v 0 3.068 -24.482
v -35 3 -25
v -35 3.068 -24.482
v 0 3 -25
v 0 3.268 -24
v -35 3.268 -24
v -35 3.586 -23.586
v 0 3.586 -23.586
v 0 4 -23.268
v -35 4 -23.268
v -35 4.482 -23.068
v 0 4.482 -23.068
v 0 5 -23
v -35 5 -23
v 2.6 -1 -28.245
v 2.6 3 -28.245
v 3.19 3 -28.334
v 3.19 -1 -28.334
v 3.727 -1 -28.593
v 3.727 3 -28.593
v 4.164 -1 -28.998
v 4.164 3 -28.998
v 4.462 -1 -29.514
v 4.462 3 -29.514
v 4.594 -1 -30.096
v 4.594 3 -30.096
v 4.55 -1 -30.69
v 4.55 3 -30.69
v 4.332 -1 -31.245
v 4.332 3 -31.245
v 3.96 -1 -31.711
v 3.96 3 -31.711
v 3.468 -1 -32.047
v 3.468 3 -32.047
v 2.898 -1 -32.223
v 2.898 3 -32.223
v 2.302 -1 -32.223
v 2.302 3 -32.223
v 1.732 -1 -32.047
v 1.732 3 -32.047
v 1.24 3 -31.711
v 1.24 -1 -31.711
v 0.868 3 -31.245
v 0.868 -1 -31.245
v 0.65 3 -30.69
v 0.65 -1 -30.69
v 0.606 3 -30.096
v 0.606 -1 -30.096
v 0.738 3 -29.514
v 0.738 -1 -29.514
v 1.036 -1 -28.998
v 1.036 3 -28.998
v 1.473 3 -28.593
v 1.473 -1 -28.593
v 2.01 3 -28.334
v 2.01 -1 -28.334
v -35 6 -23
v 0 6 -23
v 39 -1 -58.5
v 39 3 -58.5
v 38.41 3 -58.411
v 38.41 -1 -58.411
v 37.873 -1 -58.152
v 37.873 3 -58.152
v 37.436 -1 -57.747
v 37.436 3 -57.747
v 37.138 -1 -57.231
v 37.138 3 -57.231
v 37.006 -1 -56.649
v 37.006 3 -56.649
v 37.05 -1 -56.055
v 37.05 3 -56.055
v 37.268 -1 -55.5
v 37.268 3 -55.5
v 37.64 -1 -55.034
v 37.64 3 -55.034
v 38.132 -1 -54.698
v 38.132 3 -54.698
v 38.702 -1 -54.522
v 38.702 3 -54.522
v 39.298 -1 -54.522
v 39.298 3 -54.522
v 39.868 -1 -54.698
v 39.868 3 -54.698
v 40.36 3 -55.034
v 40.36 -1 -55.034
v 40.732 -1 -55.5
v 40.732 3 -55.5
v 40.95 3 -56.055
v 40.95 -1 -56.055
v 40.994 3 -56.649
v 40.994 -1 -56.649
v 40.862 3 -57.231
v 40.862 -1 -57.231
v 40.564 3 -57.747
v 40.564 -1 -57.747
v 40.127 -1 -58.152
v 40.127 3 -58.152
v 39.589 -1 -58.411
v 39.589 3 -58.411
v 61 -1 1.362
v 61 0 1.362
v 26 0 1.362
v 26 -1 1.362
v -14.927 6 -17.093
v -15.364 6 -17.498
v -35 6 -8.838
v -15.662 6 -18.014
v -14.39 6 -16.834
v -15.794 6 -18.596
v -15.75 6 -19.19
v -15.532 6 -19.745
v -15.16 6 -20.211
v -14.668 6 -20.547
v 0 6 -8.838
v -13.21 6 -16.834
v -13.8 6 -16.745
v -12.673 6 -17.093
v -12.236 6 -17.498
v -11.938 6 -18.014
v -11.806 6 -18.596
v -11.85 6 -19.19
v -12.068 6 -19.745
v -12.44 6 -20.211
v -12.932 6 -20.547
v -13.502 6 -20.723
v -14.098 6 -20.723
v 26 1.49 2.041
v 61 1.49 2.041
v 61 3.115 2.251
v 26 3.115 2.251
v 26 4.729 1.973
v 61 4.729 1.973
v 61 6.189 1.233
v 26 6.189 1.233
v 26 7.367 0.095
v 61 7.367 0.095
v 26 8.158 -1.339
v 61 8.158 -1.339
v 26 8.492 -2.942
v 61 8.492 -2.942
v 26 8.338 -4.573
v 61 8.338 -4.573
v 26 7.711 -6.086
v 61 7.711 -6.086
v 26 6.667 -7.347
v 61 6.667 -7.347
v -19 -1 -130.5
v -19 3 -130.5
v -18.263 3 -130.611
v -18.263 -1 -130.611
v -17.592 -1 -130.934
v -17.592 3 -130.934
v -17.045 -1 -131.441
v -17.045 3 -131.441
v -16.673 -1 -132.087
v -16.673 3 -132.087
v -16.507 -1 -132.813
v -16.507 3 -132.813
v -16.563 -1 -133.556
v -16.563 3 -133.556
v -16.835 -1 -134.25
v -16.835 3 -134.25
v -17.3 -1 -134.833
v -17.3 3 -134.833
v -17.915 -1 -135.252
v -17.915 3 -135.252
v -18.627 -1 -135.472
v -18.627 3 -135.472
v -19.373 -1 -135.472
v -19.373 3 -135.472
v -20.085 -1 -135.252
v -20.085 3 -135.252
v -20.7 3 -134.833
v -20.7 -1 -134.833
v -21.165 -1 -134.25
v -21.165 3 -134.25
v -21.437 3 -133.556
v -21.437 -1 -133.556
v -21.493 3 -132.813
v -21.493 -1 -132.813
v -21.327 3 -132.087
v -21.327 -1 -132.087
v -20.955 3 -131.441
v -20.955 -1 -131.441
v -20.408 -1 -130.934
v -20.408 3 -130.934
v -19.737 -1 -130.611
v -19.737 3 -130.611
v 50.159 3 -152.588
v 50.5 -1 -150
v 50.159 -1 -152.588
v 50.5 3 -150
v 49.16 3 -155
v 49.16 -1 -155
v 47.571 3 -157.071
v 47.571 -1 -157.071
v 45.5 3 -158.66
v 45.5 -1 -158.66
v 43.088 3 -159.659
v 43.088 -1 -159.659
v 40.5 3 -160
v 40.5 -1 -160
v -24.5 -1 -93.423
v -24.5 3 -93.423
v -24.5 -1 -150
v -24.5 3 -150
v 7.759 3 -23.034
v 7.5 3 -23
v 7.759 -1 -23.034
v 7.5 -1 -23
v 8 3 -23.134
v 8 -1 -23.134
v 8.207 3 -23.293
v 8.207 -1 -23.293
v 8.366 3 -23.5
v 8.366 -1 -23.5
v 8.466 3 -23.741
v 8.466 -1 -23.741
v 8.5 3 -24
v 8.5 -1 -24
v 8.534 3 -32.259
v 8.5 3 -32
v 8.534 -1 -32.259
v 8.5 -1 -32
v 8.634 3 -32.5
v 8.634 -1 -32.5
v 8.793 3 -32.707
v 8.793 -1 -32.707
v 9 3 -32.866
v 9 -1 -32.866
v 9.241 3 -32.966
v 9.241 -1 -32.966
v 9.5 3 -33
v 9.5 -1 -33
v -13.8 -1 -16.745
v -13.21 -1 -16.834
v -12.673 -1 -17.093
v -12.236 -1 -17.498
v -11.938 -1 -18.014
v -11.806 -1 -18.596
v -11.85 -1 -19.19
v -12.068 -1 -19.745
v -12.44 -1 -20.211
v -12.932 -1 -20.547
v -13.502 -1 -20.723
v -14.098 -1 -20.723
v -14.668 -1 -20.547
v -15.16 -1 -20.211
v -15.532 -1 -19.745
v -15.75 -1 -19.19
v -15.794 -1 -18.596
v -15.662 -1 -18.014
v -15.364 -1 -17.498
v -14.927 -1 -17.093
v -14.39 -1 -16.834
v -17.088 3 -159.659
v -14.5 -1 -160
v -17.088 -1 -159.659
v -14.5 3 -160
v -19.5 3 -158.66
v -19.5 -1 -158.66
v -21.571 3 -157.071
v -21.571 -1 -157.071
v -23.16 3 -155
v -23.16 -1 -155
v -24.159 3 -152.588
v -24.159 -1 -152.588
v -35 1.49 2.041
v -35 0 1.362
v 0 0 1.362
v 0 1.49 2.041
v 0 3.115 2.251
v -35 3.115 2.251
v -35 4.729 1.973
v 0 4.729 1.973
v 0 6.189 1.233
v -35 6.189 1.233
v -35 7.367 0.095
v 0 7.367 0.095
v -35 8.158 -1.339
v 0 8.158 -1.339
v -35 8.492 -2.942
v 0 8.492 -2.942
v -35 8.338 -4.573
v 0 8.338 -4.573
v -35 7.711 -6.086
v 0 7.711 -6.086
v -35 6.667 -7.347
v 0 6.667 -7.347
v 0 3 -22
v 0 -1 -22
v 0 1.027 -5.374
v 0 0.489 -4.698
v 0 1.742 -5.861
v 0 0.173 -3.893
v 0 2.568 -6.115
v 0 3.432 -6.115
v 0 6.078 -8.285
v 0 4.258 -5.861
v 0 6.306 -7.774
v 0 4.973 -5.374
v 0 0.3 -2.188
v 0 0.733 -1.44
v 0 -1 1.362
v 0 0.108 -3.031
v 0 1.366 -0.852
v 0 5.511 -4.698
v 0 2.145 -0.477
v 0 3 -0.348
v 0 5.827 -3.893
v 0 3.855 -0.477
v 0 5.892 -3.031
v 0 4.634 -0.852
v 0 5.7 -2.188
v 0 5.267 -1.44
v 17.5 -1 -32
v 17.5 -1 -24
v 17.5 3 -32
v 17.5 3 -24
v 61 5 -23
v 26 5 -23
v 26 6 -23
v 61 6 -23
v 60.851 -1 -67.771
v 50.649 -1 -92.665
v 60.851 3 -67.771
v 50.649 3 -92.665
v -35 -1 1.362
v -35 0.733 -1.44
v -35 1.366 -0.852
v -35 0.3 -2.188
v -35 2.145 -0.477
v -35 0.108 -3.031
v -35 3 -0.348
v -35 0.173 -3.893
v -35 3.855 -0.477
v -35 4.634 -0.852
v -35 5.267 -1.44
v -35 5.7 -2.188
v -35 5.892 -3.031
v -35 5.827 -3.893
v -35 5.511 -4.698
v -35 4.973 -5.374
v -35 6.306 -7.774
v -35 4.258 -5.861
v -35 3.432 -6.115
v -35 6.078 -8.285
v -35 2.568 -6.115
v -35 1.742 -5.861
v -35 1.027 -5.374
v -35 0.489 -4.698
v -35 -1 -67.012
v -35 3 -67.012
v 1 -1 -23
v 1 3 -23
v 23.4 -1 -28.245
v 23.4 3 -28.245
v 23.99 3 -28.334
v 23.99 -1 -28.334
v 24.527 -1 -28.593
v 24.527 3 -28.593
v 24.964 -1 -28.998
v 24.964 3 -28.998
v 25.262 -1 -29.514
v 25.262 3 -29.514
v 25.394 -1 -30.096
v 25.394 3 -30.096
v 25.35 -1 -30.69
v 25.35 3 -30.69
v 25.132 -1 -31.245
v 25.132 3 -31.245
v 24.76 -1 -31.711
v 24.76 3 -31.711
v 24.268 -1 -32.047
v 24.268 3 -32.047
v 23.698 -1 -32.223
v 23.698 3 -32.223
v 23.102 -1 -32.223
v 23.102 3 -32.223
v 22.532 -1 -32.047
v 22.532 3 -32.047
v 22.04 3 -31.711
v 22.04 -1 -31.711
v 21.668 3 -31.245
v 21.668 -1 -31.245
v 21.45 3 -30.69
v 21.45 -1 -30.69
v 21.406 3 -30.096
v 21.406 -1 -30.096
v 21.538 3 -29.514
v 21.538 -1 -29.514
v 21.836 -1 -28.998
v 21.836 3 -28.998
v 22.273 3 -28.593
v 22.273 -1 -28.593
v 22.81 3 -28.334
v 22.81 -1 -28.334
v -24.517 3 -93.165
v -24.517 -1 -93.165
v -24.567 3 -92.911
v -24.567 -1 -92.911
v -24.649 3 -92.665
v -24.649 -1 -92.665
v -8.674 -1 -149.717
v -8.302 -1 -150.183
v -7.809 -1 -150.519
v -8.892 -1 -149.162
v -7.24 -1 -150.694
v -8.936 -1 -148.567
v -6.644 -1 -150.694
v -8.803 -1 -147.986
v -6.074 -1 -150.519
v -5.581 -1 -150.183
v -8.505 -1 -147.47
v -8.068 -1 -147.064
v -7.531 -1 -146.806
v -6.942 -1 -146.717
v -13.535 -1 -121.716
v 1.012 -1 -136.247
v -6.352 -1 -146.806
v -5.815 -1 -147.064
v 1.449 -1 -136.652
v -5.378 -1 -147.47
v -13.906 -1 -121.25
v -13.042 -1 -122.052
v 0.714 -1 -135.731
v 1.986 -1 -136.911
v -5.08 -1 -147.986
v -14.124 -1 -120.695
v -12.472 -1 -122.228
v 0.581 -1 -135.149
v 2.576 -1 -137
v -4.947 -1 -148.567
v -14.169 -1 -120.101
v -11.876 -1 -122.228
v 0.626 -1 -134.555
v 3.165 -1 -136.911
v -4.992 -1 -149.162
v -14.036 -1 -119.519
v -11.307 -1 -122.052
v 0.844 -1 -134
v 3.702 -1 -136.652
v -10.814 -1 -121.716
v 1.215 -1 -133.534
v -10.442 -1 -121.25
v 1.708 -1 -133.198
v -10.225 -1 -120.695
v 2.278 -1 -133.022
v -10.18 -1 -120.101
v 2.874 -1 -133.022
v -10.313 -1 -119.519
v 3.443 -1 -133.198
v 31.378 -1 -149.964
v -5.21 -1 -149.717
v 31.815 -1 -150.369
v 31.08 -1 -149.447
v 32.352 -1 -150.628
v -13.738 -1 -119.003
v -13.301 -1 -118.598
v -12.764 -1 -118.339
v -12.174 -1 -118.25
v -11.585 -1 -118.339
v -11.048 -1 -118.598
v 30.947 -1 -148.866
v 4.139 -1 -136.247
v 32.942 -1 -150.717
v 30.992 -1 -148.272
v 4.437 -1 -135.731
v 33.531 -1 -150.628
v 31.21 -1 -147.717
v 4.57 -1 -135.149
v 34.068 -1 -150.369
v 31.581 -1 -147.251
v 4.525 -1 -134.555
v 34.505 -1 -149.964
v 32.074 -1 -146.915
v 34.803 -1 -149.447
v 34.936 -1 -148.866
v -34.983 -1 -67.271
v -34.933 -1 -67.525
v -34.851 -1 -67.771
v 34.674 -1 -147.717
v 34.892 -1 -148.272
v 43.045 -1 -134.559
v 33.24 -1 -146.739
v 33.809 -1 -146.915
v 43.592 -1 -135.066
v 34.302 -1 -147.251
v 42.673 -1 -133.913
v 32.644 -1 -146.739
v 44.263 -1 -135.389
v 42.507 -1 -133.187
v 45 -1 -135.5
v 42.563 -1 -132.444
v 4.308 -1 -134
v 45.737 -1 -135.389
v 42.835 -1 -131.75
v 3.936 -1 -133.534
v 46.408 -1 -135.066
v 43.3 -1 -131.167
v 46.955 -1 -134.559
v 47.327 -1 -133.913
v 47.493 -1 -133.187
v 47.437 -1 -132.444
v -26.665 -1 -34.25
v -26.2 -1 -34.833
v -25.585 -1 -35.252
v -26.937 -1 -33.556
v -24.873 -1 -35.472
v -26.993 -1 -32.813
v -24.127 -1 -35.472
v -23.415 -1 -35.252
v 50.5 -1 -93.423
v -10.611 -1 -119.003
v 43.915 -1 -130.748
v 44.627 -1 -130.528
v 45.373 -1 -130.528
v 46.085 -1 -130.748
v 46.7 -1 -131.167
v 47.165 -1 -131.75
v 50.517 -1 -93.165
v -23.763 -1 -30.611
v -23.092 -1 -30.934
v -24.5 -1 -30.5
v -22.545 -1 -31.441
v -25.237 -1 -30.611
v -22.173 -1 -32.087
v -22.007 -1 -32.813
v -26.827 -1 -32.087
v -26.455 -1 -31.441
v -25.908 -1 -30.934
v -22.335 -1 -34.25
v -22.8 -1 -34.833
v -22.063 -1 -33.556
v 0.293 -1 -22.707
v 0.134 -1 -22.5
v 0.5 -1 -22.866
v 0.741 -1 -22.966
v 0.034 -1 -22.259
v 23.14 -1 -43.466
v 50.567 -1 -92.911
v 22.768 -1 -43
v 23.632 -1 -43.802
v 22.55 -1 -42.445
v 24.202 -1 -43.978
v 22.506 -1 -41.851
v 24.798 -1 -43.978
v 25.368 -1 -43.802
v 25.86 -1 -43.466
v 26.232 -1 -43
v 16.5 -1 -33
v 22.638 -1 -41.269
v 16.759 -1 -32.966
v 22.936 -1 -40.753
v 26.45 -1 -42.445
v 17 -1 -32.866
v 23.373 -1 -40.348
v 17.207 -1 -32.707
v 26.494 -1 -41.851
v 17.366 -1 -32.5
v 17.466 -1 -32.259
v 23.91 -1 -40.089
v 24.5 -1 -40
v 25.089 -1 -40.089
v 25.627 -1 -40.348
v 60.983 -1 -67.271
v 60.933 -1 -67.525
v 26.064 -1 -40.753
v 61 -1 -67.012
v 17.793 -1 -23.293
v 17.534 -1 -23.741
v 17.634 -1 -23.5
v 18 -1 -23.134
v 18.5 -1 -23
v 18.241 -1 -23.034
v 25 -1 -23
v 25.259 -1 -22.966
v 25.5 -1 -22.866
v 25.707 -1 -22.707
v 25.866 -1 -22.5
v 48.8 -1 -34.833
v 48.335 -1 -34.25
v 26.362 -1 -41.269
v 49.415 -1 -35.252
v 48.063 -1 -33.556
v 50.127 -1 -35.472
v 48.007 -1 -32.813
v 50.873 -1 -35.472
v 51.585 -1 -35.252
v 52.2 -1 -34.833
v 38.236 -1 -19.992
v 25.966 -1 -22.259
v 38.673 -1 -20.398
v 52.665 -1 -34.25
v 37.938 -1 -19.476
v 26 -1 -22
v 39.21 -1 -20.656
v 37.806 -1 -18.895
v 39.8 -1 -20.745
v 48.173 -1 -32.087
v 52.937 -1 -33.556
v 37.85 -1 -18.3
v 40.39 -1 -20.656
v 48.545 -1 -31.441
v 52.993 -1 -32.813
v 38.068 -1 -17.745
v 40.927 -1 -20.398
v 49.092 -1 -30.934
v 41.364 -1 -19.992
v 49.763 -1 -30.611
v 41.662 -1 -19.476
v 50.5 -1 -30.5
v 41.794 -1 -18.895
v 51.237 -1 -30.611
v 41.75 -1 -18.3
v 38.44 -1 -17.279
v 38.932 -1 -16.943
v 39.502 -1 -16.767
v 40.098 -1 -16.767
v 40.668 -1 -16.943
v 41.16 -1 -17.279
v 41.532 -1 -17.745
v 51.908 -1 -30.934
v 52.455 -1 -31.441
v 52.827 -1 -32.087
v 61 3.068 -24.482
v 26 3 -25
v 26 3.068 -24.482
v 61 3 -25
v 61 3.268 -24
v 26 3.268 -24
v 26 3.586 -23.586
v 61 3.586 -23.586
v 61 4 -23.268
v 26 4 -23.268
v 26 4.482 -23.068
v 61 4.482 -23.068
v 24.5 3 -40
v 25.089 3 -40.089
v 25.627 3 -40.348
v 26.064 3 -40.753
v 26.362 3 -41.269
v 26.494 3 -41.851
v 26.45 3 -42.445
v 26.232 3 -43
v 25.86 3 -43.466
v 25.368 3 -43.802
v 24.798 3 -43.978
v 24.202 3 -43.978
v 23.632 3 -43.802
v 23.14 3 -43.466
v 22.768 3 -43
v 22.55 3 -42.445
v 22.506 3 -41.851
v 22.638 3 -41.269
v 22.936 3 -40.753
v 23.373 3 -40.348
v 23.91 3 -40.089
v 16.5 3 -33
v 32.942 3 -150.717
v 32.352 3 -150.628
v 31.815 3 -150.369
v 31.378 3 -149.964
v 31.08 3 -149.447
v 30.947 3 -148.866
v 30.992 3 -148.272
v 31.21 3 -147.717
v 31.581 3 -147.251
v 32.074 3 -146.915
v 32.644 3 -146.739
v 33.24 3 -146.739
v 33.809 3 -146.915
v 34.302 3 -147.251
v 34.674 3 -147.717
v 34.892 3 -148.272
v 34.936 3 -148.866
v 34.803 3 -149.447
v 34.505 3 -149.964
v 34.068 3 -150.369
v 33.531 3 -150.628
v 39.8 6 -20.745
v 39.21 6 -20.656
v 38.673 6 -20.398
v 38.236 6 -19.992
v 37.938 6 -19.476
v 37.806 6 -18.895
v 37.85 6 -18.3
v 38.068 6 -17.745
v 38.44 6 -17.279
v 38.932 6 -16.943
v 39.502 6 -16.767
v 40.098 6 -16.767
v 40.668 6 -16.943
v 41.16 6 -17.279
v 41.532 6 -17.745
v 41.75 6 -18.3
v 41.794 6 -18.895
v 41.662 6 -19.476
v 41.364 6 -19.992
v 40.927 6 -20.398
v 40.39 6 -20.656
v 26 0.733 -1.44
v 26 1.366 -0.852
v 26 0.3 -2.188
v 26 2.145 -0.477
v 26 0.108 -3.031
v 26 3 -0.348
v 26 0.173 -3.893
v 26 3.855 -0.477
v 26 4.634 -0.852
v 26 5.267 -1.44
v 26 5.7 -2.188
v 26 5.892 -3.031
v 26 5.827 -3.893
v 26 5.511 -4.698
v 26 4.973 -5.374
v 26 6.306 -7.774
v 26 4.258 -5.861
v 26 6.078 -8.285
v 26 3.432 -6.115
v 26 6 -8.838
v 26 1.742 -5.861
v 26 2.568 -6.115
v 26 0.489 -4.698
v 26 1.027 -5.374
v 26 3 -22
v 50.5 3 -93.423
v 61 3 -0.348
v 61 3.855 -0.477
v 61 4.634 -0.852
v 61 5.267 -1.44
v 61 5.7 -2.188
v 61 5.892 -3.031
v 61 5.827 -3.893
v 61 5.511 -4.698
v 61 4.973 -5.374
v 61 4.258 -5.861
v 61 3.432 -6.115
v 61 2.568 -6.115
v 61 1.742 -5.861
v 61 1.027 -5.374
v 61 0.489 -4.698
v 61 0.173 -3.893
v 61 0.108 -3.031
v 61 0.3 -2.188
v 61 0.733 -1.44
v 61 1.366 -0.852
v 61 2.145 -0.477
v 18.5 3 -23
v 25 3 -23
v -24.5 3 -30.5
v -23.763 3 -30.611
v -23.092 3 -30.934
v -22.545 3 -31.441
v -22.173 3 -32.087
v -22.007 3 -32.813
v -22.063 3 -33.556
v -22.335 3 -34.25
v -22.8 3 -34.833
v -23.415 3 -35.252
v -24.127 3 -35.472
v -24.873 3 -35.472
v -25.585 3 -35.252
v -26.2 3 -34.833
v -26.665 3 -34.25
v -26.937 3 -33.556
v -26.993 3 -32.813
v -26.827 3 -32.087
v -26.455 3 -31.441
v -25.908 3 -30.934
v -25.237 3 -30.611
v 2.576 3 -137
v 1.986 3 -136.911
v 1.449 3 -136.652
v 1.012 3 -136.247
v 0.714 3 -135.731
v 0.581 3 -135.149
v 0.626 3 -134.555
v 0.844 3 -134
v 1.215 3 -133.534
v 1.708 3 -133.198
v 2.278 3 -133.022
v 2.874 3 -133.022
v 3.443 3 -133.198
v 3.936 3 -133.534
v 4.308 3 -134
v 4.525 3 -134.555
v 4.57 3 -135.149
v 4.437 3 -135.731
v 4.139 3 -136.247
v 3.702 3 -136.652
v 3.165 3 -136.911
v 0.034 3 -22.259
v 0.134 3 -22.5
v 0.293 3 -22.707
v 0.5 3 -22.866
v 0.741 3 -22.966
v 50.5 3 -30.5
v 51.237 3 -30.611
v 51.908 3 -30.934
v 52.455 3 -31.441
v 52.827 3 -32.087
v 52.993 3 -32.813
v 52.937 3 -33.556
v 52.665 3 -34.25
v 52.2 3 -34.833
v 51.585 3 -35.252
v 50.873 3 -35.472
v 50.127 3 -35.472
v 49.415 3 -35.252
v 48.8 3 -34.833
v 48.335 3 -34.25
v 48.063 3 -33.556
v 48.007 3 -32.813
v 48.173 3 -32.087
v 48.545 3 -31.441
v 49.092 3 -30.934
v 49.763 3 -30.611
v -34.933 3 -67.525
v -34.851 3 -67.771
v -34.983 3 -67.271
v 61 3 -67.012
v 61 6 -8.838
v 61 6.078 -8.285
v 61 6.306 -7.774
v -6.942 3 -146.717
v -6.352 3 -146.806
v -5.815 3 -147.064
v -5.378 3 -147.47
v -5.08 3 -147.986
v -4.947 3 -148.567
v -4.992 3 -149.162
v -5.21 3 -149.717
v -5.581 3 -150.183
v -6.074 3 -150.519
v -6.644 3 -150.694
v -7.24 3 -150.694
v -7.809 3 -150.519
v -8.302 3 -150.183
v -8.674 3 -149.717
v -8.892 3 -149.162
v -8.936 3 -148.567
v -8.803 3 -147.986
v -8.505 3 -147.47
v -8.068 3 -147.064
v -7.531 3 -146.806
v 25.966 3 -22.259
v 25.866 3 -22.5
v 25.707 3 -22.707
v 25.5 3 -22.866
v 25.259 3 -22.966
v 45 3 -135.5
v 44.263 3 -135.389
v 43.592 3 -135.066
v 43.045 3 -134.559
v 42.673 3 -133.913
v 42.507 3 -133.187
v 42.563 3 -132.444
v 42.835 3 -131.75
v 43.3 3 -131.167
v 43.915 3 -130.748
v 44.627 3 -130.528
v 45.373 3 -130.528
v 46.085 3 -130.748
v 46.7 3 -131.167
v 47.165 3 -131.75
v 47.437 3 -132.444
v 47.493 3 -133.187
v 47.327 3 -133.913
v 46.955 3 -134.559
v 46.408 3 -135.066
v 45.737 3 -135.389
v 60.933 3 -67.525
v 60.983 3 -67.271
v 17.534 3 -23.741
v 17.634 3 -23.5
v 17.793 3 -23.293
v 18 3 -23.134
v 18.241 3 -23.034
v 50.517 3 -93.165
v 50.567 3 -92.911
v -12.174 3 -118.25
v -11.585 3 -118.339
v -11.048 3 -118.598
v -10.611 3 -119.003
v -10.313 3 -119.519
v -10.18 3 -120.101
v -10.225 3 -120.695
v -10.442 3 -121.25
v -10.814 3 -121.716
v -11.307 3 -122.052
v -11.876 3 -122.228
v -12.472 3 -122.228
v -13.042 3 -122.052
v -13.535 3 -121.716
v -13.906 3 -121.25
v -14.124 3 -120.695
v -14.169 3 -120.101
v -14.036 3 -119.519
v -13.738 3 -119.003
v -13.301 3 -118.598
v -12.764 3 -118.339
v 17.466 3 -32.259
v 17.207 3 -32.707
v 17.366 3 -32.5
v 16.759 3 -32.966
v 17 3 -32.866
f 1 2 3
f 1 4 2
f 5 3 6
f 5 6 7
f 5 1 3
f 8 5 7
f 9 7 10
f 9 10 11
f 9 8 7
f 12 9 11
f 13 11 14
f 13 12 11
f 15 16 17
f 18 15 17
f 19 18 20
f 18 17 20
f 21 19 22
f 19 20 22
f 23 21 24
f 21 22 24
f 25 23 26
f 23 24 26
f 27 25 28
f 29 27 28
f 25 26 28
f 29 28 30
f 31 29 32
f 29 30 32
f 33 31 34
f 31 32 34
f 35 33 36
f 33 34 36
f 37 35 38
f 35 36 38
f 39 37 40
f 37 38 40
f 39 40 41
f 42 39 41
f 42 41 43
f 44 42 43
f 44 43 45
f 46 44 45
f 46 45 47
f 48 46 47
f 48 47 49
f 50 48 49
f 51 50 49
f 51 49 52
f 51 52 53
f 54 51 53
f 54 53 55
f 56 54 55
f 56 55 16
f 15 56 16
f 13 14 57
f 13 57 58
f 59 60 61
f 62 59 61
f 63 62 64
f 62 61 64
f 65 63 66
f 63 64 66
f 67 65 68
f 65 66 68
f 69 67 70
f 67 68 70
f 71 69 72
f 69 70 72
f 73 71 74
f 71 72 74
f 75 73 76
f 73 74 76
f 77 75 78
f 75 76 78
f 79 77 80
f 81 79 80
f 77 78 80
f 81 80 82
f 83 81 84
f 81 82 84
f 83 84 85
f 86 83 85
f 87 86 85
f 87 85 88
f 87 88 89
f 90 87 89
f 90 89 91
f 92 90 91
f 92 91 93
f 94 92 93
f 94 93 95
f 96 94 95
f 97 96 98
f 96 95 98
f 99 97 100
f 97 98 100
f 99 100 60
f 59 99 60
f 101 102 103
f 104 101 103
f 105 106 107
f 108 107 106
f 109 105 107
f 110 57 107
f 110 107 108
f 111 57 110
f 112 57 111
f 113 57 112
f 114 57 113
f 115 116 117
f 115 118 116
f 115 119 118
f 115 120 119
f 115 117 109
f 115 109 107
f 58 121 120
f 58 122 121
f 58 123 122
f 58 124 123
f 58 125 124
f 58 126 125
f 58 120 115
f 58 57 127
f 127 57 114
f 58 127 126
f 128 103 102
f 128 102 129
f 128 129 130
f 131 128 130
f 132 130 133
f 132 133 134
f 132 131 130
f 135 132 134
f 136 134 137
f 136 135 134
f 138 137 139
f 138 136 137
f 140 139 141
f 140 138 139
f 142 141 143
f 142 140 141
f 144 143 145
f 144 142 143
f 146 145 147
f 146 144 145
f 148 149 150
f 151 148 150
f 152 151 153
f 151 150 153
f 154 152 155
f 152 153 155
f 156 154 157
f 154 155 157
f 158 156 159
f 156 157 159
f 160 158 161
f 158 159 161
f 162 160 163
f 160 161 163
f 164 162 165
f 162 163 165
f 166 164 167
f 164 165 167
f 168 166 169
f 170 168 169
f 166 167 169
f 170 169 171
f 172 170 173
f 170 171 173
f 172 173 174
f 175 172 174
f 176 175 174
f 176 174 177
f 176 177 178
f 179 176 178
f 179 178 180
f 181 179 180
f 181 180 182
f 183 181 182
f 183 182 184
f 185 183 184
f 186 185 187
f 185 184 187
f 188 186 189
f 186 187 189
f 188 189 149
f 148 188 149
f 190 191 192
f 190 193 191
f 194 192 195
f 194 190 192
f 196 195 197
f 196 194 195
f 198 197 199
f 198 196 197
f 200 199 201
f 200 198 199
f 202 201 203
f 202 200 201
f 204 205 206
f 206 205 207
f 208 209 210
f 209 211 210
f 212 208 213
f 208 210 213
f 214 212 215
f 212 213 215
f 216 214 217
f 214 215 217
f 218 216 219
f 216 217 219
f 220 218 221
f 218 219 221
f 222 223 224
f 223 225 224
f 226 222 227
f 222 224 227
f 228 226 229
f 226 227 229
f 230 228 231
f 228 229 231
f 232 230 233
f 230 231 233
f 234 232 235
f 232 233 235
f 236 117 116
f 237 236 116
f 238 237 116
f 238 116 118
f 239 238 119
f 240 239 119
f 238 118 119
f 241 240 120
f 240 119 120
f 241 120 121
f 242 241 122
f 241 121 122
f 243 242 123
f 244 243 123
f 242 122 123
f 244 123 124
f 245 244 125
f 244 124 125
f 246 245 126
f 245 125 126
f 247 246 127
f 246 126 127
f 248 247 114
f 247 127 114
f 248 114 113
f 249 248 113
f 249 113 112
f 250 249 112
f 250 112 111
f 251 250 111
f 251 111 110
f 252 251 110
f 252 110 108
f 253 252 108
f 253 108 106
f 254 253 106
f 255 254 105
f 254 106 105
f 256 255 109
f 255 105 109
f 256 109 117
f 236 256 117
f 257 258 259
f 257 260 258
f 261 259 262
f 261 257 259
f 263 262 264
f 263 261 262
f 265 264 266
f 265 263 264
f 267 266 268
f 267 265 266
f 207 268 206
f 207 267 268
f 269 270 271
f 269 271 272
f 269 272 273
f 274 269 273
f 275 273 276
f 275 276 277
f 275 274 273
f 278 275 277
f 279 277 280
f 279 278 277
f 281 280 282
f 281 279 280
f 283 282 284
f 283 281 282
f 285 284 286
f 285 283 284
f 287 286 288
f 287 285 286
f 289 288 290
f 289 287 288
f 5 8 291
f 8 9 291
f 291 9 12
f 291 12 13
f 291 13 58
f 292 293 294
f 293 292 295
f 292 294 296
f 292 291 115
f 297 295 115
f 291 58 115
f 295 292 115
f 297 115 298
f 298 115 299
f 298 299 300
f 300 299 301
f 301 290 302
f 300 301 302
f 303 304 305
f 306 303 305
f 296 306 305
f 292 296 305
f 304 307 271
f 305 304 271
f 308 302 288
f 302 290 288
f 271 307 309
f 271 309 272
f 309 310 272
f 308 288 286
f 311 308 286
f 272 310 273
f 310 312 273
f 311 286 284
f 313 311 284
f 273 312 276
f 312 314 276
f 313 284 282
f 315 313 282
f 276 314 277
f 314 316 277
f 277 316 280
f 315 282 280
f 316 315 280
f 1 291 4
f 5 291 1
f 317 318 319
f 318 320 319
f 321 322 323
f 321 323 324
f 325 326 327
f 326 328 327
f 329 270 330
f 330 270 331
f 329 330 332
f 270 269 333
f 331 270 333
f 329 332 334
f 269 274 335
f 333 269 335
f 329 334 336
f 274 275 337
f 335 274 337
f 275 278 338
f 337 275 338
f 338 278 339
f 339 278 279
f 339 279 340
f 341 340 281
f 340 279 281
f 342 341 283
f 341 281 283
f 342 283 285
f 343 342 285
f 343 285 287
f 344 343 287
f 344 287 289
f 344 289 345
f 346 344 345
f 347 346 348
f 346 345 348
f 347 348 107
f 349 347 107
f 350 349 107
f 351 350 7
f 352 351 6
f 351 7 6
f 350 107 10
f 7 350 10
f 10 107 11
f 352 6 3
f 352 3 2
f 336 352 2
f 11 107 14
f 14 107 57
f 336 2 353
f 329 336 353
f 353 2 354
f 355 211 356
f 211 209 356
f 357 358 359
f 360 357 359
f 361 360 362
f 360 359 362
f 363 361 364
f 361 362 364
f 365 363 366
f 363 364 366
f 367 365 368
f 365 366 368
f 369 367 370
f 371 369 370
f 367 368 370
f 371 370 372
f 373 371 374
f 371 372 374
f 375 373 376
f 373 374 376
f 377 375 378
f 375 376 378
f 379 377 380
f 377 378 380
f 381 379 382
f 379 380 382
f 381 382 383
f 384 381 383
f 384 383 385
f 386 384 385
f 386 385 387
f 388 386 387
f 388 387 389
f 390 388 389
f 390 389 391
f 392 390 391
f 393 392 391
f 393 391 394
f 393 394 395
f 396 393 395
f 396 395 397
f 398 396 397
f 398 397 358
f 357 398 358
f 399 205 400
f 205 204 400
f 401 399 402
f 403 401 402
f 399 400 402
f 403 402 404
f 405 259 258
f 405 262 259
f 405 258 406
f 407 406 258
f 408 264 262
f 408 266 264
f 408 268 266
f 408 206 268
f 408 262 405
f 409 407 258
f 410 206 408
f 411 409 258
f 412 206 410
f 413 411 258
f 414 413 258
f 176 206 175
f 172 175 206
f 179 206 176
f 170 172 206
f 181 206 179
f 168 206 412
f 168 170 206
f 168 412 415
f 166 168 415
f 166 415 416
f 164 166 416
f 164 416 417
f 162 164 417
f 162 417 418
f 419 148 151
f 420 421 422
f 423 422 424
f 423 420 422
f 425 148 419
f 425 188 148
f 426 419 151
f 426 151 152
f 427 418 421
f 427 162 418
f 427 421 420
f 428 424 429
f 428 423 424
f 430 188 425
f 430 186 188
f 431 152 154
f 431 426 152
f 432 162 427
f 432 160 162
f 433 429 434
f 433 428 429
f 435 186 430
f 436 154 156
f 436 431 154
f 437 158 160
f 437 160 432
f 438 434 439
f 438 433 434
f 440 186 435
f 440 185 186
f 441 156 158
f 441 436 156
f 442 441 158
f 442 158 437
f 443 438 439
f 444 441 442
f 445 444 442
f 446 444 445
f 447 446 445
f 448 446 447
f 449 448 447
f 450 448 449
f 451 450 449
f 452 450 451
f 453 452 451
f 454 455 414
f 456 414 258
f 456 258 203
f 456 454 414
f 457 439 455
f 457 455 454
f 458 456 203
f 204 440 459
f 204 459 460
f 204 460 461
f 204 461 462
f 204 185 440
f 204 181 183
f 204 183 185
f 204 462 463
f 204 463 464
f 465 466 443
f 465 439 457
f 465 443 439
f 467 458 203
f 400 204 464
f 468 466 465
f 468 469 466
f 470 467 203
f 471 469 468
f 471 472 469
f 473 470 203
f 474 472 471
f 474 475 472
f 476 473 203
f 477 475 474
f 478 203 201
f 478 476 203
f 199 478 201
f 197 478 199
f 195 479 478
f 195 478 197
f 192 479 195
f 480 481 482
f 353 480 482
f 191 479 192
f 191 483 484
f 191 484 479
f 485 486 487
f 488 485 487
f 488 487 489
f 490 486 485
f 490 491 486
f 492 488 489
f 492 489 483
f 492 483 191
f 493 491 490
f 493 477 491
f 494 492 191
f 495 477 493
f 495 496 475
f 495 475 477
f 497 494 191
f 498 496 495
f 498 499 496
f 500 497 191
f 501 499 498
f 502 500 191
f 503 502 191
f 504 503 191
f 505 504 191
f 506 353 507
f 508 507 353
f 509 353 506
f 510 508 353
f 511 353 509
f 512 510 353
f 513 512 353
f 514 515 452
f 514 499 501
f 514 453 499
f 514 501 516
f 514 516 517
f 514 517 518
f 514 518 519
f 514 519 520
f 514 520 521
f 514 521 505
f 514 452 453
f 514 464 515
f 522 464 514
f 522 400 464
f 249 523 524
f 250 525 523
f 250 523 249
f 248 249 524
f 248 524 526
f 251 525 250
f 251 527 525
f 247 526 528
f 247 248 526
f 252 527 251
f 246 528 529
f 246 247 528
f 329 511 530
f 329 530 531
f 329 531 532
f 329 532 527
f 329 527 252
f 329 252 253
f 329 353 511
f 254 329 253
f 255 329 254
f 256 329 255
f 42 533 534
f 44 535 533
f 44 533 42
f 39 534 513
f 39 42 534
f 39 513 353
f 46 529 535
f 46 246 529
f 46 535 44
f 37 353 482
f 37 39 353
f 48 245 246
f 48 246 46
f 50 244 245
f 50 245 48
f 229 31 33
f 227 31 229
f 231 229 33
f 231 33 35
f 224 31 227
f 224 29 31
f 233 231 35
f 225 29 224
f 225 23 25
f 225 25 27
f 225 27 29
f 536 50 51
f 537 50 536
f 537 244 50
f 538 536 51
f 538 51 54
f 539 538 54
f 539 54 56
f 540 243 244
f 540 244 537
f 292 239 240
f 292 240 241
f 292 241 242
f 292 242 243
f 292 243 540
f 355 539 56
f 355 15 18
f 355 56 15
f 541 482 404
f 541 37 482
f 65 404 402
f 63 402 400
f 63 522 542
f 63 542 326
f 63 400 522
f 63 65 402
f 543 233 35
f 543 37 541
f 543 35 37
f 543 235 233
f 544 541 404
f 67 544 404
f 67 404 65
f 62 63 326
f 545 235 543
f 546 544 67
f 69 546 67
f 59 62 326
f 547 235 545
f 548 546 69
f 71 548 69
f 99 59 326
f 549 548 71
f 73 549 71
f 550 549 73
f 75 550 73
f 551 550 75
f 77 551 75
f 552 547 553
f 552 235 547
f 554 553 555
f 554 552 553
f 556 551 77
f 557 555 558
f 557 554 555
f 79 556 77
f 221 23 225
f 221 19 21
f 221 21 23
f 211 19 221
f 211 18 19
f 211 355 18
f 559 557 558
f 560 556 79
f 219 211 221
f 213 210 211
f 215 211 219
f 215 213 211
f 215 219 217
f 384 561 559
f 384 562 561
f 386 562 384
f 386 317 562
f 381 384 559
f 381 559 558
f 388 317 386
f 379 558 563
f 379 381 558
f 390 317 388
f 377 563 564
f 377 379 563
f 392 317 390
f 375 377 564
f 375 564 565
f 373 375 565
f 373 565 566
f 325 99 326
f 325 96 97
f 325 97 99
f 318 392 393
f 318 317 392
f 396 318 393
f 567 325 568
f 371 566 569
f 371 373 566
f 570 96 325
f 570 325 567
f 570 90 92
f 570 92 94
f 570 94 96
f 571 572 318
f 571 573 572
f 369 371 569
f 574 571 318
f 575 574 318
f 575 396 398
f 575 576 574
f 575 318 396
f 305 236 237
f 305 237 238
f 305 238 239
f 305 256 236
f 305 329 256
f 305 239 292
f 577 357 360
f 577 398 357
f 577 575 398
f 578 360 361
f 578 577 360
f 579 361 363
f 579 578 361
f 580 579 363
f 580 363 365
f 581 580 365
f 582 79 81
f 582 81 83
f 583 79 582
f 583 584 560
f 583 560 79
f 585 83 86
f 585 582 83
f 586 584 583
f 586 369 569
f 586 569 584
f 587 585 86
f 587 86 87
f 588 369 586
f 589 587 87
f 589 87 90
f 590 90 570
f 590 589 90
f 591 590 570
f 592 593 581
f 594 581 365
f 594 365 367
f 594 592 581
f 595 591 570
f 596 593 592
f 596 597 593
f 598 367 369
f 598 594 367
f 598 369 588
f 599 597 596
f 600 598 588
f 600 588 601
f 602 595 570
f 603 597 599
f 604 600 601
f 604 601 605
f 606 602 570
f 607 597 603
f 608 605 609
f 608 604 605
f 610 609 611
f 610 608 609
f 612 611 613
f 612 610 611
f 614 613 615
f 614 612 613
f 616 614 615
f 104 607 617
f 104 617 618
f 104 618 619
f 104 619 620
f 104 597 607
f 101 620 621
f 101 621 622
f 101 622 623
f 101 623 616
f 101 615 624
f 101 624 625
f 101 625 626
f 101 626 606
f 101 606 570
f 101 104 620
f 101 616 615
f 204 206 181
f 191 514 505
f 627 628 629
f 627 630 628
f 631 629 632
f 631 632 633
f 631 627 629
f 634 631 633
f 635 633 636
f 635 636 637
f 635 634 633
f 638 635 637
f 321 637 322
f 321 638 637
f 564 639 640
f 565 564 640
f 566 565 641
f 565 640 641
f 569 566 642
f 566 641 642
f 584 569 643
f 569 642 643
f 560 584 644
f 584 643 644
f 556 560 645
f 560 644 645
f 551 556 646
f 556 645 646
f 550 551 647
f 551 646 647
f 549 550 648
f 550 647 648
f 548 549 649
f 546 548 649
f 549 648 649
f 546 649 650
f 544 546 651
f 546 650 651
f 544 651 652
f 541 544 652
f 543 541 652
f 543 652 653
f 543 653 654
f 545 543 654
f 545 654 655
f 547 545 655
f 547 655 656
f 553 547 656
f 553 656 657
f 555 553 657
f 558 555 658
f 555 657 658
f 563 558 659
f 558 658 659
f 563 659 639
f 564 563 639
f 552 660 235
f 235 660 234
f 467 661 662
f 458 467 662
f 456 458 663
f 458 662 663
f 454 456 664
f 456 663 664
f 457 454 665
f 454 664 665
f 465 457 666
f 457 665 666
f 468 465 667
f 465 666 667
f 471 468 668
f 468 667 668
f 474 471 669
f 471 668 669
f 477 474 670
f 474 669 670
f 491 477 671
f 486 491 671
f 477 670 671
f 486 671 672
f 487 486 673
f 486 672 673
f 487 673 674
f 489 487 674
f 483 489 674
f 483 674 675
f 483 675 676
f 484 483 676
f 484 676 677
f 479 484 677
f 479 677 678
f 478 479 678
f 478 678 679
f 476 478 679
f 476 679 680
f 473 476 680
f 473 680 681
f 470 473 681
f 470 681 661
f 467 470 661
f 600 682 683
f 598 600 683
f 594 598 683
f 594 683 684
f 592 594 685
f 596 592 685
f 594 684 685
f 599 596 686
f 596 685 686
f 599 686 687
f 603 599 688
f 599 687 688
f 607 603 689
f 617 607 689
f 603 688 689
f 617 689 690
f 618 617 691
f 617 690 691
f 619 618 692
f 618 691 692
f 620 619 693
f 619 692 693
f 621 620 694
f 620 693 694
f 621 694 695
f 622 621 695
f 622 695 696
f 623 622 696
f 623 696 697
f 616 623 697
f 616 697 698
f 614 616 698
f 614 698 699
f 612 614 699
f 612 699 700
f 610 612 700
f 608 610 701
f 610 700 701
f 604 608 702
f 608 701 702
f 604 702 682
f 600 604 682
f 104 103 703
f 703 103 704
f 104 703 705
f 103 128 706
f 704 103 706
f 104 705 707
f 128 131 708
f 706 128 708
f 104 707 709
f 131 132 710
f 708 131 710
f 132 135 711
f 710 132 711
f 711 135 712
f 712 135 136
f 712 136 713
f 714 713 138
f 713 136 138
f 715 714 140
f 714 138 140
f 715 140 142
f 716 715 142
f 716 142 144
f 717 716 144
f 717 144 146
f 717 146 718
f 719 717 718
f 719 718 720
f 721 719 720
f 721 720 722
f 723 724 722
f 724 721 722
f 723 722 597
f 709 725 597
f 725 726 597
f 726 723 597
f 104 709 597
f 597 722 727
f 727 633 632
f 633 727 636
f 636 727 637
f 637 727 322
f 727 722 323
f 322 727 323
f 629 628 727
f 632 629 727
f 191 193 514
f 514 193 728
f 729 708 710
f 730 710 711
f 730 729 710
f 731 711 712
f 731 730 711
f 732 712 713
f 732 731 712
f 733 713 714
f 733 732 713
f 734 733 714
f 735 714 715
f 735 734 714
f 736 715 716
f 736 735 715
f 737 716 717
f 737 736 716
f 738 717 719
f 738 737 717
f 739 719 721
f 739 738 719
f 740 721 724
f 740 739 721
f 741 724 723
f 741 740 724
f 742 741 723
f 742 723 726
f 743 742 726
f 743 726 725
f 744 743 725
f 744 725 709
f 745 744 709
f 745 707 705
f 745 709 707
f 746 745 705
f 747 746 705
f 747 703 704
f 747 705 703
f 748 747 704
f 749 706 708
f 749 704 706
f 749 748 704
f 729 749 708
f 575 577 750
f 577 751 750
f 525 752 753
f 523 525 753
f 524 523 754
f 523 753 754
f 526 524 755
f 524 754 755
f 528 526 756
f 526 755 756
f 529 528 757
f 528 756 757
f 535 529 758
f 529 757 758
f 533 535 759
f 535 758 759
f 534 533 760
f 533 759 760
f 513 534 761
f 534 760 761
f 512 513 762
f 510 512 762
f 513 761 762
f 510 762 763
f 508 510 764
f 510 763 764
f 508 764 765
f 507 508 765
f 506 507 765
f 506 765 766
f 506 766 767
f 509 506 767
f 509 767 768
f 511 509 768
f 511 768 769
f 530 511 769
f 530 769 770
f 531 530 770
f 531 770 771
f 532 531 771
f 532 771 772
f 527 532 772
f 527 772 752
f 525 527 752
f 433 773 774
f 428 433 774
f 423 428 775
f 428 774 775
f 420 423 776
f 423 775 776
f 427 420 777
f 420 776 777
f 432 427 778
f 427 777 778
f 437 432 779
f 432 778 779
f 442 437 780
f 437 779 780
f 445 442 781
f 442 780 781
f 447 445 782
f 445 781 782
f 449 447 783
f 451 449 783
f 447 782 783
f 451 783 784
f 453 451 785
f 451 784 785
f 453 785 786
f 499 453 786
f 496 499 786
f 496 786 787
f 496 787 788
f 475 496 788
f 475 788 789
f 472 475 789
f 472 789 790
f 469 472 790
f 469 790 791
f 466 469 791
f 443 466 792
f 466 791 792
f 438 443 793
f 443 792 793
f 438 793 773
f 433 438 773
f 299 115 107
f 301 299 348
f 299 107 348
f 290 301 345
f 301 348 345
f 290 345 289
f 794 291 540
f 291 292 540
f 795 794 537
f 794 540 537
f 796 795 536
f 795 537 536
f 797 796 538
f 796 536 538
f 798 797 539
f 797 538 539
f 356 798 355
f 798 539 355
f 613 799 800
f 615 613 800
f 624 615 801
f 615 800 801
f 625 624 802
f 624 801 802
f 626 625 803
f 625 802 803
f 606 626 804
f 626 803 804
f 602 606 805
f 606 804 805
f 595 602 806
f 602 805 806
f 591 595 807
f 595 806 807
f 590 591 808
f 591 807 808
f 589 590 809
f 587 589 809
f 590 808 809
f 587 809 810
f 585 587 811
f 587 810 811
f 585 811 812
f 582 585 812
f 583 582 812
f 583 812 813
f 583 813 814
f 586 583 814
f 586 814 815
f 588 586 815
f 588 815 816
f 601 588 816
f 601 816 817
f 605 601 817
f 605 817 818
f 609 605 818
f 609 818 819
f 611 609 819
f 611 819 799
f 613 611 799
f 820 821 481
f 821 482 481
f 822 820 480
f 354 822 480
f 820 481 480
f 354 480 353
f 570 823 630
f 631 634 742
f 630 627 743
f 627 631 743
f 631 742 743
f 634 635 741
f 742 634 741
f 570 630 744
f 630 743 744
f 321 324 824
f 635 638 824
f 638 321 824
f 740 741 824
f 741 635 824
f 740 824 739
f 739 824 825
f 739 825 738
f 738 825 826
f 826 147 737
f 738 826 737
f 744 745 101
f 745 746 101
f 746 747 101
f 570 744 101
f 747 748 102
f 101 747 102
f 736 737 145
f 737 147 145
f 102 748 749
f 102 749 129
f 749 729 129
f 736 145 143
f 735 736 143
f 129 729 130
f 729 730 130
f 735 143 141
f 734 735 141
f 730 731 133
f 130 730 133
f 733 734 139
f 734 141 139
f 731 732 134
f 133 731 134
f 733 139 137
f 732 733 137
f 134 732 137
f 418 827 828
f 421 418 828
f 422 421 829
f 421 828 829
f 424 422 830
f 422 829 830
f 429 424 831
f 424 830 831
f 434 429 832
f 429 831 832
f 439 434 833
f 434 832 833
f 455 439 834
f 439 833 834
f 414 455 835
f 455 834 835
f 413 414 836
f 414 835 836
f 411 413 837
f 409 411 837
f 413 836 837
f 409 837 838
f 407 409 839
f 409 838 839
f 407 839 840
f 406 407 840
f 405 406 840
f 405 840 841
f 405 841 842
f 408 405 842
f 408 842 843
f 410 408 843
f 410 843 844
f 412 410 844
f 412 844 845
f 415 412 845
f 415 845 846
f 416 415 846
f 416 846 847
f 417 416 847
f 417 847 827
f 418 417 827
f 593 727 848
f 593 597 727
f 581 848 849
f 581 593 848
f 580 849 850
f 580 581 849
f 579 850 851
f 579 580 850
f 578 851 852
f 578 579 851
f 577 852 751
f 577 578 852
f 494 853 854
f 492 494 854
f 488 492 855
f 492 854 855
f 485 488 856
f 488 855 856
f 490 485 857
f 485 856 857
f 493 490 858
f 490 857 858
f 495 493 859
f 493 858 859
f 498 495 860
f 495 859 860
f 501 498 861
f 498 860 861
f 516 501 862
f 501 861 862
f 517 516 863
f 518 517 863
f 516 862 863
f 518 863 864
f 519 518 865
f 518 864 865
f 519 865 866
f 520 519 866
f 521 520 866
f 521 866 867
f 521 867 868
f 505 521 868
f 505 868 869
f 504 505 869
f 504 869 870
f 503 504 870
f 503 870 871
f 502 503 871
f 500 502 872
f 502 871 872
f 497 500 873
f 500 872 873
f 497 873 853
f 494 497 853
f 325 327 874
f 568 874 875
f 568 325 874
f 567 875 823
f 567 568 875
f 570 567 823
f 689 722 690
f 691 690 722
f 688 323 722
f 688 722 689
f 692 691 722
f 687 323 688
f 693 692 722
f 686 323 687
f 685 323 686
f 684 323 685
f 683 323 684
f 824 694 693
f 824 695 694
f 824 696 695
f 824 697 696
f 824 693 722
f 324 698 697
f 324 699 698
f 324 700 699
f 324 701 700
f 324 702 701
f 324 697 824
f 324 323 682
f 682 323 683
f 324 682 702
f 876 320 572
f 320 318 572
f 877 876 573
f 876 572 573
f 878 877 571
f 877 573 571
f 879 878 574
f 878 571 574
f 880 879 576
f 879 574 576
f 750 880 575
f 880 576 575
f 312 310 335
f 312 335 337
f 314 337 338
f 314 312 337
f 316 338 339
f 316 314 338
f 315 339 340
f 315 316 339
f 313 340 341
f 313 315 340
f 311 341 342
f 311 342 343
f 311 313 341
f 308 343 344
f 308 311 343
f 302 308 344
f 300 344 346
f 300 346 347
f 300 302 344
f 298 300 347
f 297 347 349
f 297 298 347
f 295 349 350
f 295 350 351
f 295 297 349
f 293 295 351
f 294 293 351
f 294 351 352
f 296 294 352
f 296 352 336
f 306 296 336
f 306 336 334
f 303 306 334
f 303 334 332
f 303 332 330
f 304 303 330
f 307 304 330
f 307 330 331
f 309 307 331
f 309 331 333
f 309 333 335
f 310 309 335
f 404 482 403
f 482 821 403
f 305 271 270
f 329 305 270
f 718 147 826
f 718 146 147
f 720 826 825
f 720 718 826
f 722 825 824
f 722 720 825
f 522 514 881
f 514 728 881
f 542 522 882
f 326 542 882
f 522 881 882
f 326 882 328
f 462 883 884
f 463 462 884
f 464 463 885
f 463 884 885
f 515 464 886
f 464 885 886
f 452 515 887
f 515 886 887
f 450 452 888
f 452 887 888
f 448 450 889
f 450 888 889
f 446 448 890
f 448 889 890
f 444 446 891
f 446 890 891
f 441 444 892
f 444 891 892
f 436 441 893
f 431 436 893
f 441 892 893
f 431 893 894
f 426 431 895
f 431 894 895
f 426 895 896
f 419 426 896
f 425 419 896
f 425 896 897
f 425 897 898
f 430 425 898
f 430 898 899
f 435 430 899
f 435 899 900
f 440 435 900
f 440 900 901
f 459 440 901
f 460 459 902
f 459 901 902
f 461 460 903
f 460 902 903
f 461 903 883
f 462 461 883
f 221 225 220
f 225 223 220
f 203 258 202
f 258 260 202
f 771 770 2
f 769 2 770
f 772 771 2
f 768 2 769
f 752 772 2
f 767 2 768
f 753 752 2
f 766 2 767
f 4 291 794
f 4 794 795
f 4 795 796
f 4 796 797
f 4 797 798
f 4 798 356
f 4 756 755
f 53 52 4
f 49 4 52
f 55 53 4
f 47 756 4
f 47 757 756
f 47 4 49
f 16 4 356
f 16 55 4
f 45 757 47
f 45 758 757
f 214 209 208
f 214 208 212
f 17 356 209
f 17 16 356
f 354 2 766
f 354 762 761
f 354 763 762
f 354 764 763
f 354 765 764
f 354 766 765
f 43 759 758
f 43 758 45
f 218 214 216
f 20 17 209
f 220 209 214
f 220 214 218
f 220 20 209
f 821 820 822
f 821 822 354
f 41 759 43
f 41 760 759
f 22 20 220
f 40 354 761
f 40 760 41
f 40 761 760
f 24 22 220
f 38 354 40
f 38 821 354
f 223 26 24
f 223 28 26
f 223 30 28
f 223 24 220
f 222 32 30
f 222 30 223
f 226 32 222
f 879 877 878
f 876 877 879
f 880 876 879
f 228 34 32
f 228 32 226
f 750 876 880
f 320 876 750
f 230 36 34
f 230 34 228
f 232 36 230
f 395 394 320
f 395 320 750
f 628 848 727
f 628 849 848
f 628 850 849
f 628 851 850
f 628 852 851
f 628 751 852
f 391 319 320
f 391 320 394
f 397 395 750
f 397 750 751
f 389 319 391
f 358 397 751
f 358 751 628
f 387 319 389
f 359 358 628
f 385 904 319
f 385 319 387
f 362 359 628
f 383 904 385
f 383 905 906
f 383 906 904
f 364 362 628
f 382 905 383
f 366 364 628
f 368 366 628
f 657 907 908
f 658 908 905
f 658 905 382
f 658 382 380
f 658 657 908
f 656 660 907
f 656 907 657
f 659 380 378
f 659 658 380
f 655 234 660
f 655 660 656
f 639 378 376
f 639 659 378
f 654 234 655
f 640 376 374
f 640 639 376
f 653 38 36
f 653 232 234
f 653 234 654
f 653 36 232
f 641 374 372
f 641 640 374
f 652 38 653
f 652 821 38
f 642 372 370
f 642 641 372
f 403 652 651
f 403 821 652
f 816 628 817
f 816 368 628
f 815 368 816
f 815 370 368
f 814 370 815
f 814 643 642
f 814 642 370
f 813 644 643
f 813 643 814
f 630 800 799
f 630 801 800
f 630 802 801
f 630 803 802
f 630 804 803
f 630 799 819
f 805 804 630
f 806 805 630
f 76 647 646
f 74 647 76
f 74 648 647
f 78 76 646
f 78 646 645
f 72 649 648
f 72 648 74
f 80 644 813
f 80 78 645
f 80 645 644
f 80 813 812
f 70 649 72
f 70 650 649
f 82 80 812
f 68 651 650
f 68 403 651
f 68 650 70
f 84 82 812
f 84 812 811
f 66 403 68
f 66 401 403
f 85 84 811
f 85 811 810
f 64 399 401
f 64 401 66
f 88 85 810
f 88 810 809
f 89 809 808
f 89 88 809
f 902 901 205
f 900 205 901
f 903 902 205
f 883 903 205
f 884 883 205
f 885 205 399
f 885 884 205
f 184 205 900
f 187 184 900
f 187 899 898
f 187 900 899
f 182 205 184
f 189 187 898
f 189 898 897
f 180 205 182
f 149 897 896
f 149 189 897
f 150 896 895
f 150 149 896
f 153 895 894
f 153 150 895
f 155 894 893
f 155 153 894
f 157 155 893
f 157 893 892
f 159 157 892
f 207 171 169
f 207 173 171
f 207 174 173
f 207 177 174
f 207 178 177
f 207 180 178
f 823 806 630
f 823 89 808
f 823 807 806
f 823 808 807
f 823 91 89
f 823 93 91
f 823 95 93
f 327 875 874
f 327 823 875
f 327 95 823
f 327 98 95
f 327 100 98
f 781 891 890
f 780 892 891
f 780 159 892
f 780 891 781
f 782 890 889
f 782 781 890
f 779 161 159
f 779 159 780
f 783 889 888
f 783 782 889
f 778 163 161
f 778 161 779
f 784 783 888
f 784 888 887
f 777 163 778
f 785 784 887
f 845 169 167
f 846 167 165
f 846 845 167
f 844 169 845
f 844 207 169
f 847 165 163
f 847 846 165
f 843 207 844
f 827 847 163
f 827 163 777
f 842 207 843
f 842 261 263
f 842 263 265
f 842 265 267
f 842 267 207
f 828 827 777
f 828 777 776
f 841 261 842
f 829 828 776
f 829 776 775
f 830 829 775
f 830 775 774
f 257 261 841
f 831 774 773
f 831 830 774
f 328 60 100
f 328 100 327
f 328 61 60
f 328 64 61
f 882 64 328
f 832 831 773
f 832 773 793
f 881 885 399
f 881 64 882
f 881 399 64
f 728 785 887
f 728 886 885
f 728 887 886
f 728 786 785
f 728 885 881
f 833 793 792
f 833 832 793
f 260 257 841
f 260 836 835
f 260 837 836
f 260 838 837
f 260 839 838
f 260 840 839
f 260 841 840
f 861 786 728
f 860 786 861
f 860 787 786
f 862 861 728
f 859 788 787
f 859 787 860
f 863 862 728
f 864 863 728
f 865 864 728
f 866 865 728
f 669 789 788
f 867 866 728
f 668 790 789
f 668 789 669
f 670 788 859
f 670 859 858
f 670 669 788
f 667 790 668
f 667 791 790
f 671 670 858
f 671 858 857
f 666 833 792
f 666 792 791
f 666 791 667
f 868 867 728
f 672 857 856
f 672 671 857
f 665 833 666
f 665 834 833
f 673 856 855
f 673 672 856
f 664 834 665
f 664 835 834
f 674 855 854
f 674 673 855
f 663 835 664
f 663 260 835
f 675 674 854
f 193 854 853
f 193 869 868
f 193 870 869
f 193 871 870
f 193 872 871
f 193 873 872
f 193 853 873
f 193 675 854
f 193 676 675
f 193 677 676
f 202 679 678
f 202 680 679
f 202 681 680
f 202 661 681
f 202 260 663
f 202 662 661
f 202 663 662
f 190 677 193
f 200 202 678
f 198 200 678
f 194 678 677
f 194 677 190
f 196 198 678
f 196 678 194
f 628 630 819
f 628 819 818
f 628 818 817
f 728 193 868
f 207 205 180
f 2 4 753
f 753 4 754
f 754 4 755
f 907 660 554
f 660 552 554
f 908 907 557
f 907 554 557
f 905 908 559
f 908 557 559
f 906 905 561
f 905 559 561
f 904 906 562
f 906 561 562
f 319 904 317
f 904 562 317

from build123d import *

# Parameters (mm, degrees)
BOSS_EXTRUDE1_DEPTH = 3
SKETCH5_W           = 35
SKETCH5_H           = 23
BOSS_EXTRUDE2_DEPTH = 3
BOSS_EXTRUDE5_DEPTH = 35
BOSS_EXTRUDE8_START = -35
BOSS_EXTRUDE8_DEPTH = 35
CUT_EXTRUDE1_START  = -96
SKETCH11_R          = 2.9
CUT_EXTRUDE1_DEPTH  = 96
BOSS_EXTRUDE7_DEPTH = 1
SKETCH17_R          = 2.5
CUT_EXTRUDE2_DEPTH  = 10
SKETCH18_R          = 2
CUT_EXTRUDE3_DEPTH  = 10
SKETCH19_R          = 2
CUT_EXTRUDE4_DEPTH  = 4
SKETCH21_R          = 2
CUT_EXTRUDE5_DEPTH  = 7
SKETCH22_R          = 2.5
CUT_EXTRUDE6_DEPTH  = 4
FILLET1_R           = 10
FILLET2_R           = 2
FILLET3_R           = 2
FILLET4_R           = 1


with BuildPart() as part:
    # Sketch1 → Boss-Extrude1 (new body)
    with BuildSketch(Plane(origin=(0, 0, 0), x_dir=(1, 0, 0), z_dir=(0, 1, 0))):
        Polygon((0, 0), (0, 23), (8.5, 23), (8.5, 33), (17.5, 33), (17.5, 23), (26, 23), (26, 0), (61, 0), (61, 28.801365462), (61, 67.406151765), (50.5, 93.029580251), (50.5, 160), (-24.5, 160), (-24.5, 93.029580251), (-35, 67.406151765), (-35, 28.801365462), (-35, 0), align=None)
    extrude(amount=BOSS_EXTRUDE1_DEPTH)

    # Sketch5 → Boss-Extrude2 (add)
    with BuildSketch(Plane(origin=(0, 3, 0), x_dir=(1, 0, 0), z_dir=(0, 1, 0))):
        with Locations((-17.5, 11.5)):
            Rectangle(SKETCH5_W, SKETCH5_H)
        with Locations((43.5, 11.5)):
            Rectangle(SKETCH5_W, SKETCH5_H)
    extrude(amount=BOSS_EXTRUDE2_DEPTH)

    # Sketch12 → Boss-Extrude5 (add)
    with BuildSketch(Plane.ZY.offset(35)):
        with BuildLine():
            Line((-7.857598958, 0), (1.361945499, 0))
            ThreePointArc((1.361945499, 0), (-3.247826729, 8.5), (-7.857598958, 0))
        make_face()
    extrude(amount=-BOSS_EXTRUDE5_DEPTH)

    # Sketch15 → Boss-Extrude8 (add)
    with BuildSketch(Plane(origin=(61, 0, 0), x_dir=(0, 0, -1), z_dir=(1, 0, 0)).offset(BOSS_EXTRUDE8_START)):
        with BuildLine():
            Line((7.857598958, 0), (-1.361945499, 0))
            ThreePointArc((-1.361945499, 0), (3.247826729, 8.5), (7.857598958, 0))
        make_face()
    extrude(amount=BOSS_EXTRUDE8_DEPTH)

    # Sketch11 → Cut-Extrude1 (cut)
    with BuildSketch(Plane.ZY.offset(35).offset(CUT_EXTRUDE1_START)):
        with Locations((-3.247826729, 3)):
            Circle(SKETCH11_R)
    extrude(amount=CUT_EXTRUDE1_DEPTH, mode=Mode.SUBTRACT)

    # Sketch14 → Boss-Extrude7 (add)
    with BuildSketch(Plane.XZ):
        Polygon((50.5, -93.029580251), (61, -67.406151765), (61, 1.361945499), (26, 1.361945499), (26, -23), (17.5, -23), (17.5, -33), (8.5, -33), (8.5, -23), (0, -23), (0, 1.361945499), (-35, 1.361945499), (-35, -67.406151765), (-24.5, -93.029580251), (-24.5, -160), (50.5, -160), align=None)
    extrude(amount=BOSS_EXTRUDE7_DEPTH)

    # Sketch17 → Cut-Extrude2 (cut)
    with BuildSketch(Plane(origin=(0, 3, 0), x_dir=(1, 0, 0), z_dir=(0, 1, 0))):
        with Locations(Location((-24.5, 33, 0), (0, 0, 270))):
            Circle(SKETCH17_R)
        with Locations(Location((50.5, 33, 0), (0, 0, 270))):
            Circle(SKETCH17_R)
    extrude(amount=-CUT_EXTRUDE2_DEPTH, mode=Mode.SUBTRACT)

    # Sketch18 → Cut-Extrude3 (cut)
    with BuildSketch(Plane(origin=(0, 3, 0), x_dir=(1, 0, 0), z_dir=(0, 1, 0))):
        with Locations(Location((-6.941705, 148.716738, 0), (0, 0, 270))):
            Circle(SKETCH18_R)
        with Locations(Location((32.941705, 148.716738, 0), (0, 0, 90))):
            Circle(SKETCH18_R)
    extrude(amount=-CUT_EXTRUDE3_DEPTH, mode=Mode.SUBTRACT)

    # Sketch19 → Cut-Extrude4 (cut)
    with BuildSketch(Plane(origin=(0, 3, 0), x_dir=(1, 0, 0), z_dir=(0, 1, 0))):
        with Locations(Location((-12.17438, 120.25, 0), (0, 0, 270))):
            Circle(SKETCH19_R)
        with Locations(Location((2.57562, 135, 0), (0, 0, 90))):
            Circle(SKETCH19_R)
        with Locations(Location((24.49992, 42, 0), (0, 0, 270))):
            Circle(SKETCH19_R)
        with Locations(Location((38.99992, 56.5, 0), (0, 0, 90))):
            Circle(SKETCH19_R)
    extrude(amount=-CUT_EXTRUDE4_DEPTH, mode=Mode.SUBTRACT)

    # Sketch21 → Cut-Extrude5 (cut)
    with BuildSketch(Plane(origin=(0, 6, 0), x_dir=(1, 0, 0), z_dir=(0, 1, 0))):
        with Locations(Location((-13.8, 18.7451, 0), (0, 0, 270))):
            Circle(SKETCH21_R)
        with Locations(Location((2.6, 30.245, 0), (0, 0, 270))):
            Circle(SKETCH21_R)
        with Locations(Location((23.4, 30.245, 0), (0, 0, 270))):
            Circle(SKETCH21_R)
        with Locations(Location((39.8, 18.7451, 0), (0, 0, 90))):
            Circle(SKETCH21_R)
    extrude(amount=-CUT_EXTRUDE5_DEPTH, mode=Mode.SUBTRACT)

    # Sketch22 → Cut-Extrude6 (cut)
    with BuildSketch(Plane(origin=(0, 3, 0), x_dir=(1, 0, 0), z_dir=(0, 1, 0))):
        with Locations(Location((-19, 133, 0), (0, 0, 270))):
            Circle(SKETCH22_R)
        with Locations(Location((45, 133, 0), (0, 0, 90))):
            Circle(SKETCH22_R)
    extrude(amount=-CUT_EXTRUDE6_DEPTH, mode=Mode.SUBTRACT)

    # Fillet1
    fillet1_edges = [part.edges().sort_by_distance(p)[0] for p in [
        (-24.5, 1, -160),
        (50.5, 1, -160),
    ]]
    fillet(fillet1_edges, radius=FILLET1_R)

    # Fillet2
    fillet2_edges = [part.edges().sort_by_distance(p)[0] for p in [
        (50.5, 1, -93.029580251),
        (61, 1, -67.406151765),
        (-17.5, 3, -23),
        (43.5, 3, -23),
        (-17.5, 6, -7.857598958),
        (43.5, 6, -7.857598958),
    ]]
    fillet(fillet2_edges, radius=FILLET2_R)

    # Fillet3
    fillet3_edges = [part.edges().sort_by_distance(p)[0] for p in [
        (-35, 1, -67.406151765),
        (-24.5, 1, -93.029580251),
    ]]
    fillet(fillet3_edges, radius=FILLET3_R)

    # Fillet4
    fillet4_edges = [part.edges().sort_by_distance(p)[0] for p in [
        (26, 1, -23),
        (17.5, 1, -23),
        (17.5, 1, -33),
        (8.5, 1, -33),
        (8.5, 1, -23),
        (0, 1, -23),
    ]]
    fillet(fillet4_edges, radius=FILLET4_R)


solid = part.part
